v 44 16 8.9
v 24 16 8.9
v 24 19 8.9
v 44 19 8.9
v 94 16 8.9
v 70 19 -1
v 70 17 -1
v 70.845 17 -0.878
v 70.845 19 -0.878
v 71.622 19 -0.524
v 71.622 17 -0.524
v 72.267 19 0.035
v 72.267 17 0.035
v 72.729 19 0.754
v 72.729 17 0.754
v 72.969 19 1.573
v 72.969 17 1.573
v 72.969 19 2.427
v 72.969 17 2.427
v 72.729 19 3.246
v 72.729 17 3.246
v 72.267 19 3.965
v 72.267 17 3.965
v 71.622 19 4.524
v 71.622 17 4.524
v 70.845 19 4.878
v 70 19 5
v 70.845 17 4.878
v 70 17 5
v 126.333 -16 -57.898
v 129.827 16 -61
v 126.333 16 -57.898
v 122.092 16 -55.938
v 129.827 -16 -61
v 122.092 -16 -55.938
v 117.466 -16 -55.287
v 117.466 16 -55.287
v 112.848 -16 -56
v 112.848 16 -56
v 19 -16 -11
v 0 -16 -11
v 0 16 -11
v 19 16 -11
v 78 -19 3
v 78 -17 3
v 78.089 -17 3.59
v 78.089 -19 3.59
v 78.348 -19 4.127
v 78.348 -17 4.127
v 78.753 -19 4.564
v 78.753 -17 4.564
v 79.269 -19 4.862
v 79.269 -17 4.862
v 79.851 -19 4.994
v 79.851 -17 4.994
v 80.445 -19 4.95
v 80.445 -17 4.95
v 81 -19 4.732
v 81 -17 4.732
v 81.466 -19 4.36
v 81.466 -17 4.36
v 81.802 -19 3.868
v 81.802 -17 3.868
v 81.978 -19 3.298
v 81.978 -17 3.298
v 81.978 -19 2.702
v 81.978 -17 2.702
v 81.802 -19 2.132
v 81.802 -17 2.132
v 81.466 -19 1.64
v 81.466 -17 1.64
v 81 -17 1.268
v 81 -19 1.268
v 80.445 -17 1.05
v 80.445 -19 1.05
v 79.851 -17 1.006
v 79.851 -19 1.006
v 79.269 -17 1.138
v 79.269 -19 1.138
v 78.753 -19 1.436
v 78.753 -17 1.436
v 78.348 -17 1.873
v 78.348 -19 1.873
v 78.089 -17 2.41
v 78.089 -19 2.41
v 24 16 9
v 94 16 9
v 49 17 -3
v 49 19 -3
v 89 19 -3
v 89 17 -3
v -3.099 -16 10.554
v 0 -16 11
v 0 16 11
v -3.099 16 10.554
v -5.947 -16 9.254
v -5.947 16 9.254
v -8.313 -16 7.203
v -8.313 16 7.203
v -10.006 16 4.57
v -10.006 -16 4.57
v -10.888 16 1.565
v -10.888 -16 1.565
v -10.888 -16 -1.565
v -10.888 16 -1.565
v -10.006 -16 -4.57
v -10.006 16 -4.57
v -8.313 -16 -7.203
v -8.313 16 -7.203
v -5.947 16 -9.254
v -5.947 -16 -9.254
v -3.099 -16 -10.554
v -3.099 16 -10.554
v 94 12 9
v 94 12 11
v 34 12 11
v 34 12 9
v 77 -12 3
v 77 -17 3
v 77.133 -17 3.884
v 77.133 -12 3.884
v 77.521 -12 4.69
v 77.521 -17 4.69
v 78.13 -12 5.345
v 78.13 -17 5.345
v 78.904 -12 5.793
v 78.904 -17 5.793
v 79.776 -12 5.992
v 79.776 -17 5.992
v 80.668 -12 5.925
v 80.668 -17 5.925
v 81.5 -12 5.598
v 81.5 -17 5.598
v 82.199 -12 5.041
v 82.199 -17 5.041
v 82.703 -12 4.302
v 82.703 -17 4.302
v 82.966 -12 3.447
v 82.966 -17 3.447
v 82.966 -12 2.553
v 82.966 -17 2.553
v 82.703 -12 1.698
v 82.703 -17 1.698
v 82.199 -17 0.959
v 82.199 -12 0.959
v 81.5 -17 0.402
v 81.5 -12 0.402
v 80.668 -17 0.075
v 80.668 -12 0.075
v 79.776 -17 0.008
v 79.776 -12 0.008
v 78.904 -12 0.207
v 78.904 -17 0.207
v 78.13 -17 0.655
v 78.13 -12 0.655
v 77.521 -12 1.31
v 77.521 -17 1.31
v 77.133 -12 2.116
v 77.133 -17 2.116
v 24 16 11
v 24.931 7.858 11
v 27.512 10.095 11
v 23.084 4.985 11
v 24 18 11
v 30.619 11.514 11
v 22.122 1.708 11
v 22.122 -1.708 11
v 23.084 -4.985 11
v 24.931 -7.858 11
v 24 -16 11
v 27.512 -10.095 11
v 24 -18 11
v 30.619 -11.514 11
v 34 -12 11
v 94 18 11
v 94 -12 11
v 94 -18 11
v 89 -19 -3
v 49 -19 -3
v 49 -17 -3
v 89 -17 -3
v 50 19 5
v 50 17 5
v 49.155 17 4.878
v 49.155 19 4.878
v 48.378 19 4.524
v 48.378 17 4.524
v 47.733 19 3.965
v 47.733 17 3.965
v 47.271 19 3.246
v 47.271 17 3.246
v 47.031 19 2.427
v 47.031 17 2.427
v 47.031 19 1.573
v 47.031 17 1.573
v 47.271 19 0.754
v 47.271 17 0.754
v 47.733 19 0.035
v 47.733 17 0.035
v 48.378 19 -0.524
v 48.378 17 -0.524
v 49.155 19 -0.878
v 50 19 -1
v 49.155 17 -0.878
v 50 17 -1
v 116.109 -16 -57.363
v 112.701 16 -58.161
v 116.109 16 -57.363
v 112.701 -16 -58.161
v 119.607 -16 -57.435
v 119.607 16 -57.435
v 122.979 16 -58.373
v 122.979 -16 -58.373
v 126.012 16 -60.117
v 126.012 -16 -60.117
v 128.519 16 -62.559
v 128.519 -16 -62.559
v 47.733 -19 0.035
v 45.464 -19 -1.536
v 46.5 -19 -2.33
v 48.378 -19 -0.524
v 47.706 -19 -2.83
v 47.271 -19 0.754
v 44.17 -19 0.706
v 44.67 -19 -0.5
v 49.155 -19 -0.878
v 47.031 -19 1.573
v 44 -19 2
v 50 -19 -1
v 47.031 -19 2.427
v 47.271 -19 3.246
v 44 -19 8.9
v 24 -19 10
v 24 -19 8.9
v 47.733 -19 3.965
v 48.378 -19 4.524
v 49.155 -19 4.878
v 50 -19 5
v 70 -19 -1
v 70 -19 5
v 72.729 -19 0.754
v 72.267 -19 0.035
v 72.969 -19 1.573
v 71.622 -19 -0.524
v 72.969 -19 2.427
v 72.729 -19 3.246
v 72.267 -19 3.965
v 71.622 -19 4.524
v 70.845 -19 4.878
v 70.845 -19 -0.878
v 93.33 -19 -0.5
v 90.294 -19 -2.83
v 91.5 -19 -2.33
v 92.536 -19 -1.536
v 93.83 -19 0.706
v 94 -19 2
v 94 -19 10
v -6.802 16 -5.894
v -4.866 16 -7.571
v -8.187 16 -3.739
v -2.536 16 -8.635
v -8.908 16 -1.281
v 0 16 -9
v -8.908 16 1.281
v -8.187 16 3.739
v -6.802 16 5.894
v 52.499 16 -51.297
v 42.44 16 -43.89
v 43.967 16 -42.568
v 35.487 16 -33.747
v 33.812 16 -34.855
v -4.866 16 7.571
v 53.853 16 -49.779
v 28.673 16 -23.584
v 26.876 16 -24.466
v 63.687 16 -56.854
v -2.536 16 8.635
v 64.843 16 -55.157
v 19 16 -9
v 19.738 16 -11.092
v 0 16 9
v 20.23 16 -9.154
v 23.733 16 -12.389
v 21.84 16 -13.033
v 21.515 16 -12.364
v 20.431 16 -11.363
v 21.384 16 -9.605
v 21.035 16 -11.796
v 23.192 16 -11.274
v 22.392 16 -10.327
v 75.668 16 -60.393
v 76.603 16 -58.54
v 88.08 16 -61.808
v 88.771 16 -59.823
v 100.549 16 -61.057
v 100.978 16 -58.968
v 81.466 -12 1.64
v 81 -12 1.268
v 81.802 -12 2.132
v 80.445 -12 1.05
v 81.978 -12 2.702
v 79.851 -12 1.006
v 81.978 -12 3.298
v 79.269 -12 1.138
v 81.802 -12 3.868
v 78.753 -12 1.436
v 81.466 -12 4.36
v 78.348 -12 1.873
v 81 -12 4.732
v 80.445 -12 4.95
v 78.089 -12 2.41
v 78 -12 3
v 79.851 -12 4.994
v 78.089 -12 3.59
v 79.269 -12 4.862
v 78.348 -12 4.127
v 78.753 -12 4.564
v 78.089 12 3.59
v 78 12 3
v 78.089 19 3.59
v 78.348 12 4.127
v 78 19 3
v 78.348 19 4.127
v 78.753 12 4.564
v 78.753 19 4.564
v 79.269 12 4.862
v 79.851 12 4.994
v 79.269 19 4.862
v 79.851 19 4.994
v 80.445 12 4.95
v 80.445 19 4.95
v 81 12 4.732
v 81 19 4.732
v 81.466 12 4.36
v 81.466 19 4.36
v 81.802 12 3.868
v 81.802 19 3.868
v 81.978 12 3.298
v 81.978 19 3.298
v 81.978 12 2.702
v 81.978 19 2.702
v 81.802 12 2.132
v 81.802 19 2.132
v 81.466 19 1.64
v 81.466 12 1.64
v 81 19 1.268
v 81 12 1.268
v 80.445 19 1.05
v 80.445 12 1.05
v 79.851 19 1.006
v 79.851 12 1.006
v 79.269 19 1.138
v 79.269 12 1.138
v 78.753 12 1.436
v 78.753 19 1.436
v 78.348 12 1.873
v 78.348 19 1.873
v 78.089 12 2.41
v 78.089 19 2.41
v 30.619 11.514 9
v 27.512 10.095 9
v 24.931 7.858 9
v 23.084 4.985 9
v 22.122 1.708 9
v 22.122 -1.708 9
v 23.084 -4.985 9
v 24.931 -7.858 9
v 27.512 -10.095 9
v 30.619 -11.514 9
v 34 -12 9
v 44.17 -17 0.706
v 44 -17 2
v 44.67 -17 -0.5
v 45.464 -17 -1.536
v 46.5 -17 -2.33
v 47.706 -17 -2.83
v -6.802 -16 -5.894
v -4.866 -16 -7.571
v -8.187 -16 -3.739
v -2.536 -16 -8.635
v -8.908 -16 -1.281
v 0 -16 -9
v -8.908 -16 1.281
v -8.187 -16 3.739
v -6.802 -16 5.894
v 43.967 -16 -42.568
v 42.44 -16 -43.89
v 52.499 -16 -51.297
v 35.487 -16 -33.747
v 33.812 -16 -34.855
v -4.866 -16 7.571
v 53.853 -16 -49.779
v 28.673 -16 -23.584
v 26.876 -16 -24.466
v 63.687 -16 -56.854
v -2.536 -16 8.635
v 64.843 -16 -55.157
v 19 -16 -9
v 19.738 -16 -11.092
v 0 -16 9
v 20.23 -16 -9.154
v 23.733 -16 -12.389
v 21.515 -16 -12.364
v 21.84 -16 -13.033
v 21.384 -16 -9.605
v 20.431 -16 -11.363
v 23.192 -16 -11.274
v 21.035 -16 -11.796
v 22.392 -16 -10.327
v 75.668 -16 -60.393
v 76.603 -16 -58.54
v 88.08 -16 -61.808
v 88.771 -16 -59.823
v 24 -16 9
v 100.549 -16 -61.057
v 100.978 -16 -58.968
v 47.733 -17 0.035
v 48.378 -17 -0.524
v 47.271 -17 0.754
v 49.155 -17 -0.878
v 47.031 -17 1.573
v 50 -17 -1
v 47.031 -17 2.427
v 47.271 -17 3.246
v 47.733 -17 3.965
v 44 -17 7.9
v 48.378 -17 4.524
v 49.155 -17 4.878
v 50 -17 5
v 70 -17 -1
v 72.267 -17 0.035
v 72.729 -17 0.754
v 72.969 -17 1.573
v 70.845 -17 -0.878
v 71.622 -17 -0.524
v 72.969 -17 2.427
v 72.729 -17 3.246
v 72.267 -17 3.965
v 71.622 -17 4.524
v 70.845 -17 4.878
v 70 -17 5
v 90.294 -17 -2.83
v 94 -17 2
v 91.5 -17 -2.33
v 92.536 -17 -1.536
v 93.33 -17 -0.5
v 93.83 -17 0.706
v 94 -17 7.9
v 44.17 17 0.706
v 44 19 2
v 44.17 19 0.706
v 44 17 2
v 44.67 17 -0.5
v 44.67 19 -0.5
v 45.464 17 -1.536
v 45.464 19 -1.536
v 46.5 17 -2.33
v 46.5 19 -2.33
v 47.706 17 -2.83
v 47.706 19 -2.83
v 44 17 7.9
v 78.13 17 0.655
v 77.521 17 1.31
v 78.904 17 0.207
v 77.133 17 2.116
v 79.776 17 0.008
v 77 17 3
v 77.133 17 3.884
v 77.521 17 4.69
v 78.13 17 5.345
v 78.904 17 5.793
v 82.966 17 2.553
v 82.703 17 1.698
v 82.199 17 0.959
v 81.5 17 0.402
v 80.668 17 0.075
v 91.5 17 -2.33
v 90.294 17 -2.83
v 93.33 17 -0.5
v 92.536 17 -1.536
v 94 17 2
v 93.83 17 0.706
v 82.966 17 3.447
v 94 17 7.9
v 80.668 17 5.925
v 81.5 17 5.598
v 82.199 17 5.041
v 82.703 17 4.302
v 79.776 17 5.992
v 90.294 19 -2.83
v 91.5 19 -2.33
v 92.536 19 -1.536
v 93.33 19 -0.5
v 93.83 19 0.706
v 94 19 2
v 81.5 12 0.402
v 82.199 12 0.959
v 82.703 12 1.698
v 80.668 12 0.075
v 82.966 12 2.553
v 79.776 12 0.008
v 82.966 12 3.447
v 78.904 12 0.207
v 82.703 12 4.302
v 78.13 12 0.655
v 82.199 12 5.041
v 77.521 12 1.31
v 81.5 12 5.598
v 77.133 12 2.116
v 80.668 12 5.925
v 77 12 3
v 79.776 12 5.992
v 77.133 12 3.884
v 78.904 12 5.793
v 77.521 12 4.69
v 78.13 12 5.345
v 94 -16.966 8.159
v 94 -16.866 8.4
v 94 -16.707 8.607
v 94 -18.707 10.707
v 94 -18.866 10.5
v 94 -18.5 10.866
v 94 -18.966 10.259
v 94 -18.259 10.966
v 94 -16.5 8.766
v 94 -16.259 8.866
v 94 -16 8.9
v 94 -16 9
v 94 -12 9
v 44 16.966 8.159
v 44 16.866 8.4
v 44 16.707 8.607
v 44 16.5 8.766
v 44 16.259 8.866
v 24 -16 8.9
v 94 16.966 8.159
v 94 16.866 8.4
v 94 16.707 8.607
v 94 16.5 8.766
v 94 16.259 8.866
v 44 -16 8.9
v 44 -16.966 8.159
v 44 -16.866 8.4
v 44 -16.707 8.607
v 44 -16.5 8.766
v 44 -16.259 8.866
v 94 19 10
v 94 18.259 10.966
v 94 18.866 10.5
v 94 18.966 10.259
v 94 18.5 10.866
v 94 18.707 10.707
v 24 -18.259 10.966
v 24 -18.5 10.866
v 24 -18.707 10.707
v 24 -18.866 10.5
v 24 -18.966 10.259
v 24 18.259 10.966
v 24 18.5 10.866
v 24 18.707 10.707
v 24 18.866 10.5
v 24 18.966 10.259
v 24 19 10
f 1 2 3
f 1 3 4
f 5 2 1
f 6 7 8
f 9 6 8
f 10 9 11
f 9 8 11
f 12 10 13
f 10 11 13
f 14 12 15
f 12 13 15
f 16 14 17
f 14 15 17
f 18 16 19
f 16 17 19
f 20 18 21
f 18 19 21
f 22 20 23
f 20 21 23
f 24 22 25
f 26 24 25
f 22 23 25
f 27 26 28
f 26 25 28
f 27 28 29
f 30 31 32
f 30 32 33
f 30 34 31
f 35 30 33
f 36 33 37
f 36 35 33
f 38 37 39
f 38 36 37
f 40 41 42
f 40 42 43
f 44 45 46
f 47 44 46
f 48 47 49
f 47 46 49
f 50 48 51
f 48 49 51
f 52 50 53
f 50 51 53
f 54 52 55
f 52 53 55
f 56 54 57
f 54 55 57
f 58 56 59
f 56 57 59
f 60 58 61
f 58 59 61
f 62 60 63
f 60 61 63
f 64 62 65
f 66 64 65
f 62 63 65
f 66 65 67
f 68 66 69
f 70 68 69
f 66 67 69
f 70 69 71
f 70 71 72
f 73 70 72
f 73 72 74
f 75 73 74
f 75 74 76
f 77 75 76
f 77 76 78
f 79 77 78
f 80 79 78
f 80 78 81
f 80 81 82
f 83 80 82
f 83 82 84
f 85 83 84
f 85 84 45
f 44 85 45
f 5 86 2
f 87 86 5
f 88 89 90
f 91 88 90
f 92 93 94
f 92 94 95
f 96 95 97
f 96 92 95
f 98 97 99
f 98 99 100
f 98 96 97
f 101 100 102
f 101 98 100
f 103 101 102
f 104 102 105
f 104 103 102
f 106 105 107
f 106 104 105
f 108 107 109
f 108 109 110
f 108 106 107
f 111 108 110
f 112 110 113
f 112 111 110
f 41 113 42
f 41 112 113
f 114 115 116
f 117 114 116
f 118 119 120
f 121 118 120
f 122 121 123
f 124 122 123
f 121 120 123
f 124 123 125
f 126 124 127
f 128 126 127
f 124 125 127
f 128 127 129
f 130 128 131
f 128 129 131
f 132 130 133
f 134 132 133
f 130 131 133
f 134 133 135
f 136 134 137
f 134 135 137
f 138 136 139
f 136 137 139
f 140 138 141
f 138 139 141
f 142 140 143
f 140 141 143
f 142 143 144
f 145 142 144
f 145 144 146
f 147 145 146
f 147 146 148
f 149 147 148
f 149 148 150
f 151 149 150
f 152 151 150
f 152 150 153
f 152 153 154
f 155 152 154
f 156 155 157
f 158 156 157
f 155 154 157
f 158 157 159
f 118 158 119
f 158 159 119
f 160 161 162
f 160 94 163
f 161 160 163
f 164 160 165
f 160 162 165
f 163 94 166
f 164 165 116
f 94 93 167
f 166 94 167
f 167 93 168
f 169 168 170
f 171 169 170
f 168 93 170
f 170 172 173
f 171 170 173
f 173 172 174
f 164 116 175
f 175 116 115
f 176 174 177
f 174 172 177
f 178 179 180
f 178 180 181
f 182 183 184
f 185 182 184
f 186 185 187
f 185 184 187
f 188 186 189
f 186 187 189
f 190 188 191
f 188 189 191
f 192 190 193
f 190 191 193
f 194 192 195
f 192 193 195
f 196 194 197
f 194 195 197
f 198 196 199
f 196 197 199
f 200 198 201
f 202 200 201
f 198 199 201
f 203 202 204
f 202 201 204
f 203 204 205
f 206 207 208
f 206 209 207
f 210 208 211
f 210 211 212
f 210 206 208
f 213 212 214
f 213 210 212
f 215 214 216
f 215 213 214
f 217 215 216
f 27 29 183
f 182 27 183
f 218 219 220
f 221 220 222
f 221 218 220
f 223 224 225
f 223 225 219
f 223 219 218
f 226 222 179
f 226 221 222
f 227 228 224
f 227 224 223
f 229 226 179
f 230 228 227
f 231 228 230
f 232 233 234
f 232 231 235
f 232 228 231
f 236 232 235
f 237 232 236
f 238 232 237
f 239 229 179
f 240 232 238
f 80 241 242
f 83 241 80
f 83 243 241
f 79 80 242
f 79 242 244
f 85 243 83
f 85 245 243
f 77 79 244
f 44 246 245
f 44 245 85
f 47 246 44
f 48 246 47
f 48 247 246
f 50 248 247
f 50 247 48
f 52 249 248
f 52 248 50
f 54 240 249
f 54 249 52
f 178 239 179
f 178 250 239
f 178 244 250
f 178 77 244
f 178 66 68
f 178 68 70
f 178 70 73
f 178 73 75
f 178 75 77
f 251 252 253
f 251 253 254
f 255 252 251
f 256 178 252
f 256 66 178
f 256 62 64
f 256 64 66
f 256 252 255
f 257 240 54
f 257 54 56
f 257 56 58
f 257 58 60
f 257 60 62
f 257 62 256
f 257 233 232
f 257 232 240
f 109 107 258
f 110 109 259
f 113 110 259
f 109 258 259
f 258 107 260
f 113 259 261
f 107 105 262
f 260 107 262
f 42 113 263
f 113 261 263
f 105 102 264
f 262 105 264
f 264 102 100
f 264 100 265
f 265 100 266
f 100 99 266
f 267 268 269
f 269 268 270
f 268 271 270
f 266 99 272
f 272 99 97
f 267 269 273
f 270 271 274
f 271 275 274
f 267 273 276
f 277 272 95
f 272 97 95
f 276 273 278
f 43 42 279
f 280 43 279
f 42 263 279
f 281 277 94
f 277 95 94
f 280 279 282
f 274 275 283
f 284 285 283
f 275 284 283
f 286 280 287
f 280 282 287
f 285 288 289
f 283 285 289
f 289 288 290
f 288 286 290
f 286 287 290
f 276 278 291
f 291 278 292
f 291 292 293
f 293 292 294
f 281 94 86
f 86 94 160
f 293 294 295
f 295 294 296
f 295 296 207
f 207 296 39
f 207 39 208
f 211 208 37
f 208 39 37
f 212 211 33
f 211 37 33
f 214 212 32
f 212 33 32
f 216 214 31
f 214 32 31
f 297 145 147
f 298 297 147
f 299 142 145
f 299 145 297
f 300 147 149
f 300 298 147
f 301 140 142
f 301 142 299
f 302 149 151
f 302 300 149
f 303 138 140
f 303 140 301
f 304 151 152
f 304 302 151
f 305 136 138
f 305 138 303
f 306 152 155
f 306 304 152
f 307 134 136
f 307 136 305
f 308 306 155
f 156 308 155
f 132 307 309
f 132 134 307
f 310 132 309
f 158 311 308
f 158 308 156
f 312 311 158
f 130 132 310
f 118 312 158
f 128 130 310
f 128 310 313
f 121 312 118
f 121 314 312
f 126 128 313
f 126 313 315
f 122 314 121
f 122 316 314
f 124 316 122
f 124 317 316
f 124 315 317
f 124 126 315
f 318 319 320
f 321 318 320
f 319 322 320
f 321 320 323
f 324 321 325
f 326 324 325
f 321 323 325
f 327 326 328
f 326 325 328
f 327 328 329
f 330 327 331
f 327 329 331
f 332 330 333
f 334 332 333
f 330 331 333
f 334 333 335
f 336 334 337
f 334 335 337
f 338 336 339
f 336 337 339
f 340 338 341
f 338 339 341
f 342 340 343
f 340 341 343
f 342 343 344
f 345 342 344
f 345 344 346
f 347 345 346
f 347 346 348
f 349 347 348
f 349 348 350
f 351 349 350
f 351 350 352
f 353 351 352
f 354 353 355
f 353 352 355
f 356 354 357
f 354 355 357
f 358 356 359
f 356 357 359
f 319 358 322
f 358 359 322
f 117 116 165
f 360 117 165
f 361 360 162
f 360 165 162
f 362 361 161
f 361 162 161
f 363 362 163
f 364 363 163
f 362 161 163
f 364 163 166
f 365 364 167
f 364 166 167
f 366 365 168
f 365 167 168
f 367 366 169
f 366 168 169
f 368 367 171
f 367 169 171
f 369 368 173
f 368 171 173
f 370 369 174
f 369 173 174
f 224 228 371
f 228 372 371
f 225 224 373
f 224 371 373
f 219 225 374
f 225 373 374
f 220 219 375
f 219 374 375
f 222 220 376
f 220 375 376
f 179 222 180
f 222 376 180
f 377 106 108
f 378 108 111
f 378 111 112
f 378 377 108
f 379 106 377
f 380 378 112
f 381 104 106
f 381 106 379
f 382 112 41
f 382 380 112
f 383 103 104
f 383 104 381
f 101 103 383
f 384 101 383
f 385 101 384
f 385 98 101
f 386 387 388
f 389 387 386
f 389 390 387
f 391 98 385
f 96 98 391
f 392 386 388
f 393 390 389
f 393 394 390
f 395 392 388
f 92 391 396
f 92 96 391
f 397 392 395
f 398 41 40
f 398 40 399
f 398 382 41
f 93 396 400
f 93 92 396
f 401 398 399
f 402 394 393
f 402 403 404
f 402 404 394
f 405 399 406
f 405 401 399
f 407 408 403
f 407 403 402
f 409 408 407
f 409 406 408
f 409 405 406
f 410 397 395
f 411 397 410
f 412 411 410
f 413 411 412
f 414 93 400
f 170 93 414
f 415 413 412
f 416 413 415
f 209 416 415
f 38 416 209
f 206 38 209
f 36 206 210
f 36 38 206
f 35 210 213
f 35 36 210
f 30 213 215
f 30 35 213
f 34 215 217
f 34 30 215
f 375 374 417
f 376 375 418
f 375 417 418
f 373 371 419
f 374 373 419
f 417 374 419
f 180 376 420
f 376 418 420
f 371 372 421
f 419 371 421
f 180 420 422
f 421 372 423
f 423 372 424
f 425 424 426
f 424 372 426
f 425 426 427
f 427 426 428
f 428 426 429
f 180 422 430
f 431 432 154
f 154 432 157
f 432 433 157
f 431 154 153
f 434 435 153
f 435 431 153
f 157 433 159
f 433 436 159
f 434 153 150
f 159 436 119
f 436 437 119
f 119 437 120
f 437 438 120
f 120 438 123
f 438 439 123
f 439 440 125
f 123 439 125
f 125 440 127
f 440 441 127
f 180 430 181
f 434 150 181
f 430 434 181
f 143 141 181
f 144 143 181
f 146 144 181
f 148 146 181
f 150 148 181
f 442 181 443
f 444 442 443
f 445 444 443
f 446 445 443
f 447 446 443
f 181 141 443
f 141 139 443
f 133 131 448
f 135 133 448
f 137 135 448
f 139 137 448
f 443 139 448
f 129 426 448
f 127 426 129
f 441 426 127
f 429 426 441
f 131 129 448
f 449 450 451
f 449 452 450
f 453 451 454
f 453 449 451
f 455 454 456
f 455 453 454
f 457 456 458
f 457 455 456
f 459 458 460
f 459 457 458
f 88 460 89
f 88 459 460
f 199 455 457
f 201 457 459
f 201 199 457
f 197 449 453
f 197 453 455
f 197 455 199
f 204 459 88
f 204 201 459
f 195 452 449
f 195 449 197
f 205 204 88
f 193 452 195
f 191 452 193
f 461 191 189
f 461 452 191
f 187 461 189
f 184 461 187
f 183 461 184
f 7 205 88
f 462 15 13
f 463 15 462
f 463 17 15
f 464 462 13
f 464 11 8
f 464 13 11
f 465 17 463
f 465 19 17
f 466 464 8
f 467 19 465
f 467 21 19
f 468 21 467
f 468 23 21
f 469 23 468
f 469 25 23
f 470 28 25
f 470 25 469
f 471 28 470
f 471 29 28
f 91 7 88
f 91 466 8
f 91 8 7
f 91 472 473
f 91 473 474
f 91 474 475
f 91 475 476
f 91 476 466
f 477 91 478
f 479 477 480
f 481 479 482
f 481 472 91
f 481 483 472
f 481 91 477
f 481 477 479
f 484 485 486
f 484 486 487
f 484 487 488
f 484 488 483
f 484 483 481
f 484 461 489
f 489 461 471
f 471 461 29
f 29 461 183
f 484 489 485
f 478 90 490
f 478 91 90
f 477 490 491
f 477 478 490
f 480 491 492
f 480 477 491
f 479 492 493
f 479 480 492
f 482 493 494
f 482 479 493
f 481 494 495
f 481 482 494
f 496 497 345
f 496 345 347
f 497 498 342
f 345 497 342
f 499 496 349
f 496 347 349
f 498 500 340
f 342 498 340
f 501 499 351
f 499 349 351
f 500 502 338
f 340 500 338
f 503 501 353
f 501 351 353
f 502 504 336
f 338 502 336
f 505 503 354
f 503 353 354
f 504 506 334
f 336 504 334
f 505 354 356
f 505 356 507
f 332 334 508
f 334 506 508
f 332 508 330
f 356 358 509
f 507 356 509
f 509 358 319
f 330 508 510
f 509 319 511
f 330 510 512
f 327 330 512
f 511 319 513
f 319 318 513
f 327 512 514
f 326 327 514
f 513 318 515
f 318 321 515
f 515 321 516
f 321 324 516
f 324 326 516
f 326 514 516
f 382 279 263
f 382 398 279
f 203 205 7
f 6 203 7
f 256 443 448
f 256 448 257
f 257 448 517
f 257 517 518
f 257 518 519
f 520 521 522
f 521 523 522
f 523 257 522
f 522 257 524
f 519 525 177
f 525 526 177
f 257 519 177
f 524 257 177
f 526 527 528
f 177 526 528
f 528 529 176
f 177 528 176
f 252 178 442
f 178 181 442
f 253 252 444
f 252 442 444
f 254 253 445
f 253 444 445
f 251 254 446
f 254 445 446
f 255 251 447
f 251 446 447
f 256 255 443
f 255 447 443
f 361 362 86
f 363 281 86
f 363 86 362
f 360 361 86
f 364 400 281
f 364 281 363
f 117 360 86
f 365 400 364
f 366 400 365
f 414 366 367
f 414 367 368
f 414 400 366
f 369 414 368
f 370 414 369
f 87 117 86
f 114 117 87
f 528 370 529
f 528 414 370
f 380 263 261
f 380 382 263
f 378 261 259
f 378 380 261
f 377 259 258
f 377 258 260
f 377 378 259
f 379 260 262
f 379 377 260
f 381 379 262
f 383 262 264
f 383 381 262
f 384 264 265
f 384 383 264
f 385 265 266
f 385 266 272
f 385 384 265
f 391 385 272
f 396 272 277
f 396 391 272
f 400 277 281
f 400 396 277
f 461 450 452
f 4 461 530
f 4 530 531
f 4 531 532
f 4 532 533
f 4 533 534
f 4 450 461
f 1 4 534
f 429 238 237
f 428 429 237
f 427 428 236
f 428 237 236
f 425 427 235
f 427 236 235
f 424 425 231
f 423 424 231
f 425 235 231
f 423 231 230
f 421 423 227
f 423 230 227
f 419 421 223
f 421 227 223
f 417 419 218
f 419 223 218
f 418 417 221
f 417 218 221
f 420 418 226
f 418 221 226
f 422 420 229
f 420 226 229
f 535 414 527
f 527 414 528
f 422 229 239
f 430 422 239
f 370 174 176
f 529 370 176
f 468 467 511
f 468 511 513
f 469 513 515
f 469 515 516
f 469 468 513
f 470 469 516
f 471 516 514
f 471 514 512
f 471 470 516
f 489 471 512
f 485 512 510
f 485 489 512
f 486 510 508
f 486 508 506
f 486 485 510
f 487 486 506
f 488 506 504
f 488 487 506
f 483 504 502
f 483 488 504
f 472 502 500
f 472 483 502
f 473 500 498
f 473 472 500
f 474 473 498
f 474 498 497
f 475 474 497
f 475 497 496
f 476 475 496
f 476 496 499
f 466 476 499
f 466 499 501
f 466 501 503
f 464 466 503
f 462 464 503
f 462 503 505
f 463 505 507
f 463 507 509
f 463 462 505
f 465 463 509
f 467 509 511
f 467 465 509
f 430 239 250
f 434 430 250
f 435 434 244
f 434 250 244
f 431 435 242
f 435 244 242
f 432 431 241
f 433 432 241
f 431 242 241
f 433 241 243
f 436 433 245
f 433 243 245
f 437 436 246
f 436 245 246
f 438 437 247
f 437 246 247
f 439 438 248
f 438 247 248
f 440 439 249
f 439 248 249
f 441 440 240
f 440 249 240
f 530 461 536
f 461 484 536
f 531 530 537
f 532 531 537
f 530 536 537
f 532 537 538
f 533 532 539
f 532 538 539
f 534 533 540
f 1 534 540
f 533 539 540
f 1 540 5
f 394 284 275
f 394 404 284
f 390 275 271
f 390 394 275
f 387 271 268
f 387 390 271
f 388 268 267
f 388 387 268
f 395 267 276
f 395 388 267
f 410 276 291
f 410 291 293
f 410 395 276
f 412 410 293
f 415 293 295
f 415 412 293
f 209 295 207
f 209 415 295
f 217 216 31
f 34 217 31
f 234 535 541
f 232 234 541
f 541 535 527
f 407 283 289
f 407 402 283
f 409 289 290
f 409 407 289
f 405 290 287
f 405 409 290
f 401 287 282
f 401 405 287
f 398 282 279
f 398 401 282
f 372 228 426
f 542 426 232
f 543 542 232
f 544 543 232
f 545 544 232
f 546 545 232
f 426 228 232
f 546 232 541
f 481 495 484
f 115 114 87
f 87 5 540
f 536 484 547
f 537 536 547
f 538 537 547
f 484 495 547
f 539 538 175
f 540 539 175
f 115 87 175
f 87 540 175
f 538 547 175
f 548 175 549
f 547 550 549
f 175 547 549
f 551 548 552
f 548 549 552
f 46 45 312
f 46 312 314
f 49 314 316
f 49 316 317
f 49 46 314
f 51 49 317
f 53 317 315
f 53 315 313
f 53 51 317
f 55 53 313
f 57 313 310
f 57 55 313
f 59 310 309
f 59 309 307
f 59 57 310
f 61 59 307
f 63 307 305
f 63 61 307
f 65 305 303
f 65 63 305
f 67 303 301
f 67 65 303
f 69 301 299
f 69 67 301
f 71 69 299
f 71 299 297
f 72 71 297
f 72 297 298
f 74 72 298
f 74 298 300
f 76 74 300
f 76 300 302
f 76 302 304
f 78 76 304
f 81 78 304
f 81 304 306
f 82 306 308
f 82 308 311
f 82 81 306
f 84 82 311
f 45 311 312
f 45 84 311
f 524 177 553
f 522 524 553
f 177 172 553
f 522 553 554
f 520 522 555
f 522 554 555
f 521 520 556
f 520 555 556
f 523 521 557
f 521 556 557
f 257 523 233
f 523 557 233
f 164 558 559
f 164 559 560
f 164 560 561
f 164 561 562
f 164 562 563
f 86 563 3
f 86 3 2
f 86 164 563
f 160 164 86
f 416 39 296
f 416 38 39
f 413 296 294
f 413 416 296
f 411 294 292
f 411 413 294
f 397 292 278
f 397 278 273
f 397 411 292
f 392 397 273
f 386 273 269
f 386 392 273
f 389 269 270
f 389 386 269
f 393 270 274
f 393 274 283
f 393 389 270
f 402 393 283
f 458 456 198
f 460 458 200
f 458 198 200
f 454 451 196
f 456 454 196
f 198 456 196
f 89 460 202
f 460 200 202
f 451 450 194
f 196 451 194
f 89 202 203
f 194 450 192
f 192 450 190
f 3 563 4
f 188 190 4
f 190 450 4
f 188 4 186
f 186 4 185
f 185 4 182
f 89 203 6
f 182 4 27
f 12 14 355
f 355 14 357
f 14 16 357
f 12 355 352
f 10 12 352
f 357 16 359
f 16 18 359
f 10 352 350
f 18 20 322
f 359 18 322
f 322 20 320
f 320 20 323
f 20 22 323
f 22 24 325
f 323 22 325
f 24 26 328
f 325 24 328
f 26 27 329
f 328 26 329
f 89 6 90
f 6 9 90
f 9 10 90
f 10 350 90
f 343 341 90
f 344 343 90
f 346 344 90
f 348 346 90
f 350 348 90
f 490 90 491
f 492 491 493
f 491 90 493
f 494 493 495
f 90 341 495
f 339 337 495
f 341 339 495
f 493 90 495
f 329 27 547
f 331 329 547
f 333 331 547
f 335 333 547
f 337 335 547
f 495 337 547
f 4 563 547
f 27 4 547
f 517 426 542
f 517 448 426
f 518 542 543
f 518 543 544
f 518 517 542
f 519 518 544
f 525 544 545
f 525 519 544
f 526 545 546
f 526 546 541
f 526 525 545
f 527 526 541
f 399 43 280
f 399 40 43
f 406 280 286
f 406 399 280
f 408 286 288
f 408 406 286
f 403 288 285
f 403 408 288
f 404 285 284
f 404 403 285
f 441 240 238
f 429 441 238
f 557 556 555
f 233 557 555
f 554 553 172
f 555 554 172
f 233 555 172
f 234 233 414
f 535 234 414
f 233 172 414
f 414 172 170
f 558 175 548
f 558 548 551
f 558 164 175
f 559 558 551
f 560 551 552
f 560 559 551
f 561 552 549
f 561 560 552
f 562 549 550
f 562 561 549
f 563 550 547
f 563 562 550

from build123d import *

# Parameters (mm, degrees)
F1_DEPTH  = 16
F2_W      = 70
F2_H      = 3
F3_DEPTH  = 2.1
F4_W      = 50
F4_H      = 14
F5_DEPTH  = 2
F6_R      = 0.99999
F9_DEPTH  = 2
F11_DEPTH = 38.001
F13_D     = 4
F14_R     = 3
F14_R_2   = 2
F15_DEPTH = 5
F16_R     = 5


# Not quite as in the source:
# - a fillet or chamfer is up to 0.001 mm smaller than in the source, because OpenCascade refuses the exact size
# - a pattern or mirror of a feature is missing from the dataset's text; its kind, count and spacing are read off the source's solid


with BuildPart() as f1:
    # F0 (on Front) → F1 (new body)
    with BuildSketch(Plane.XZ):
        with BuildLine():
            ThreePointArc((0, -9), (-9, 0), (0, 9))
            Line((0, 9), (94, 9))
            Line((94, 9), (94, 11))
            Line((94, 11), (0, 11))
            ThreePointArc((0, 11), (-11, 0), (0, -11))
            Line((0, -11), (19, -11))
            ThreePointArc((19, -11), (20.7464347921, -11.5607448848), (21.84, -13.0333563221))
            ThreePointArc((21.84, -13.0333563221), (57.9725997897, -54.3183684737), (112.7014609544, -58.1613818136))
            ThreePointArc((112.7014609544, -58.1613818136), (121.3224001133, -57.7984242203), (128.5187831367, -62.5591386181))
            Line((128.5187831367, -62.5591386181), (129.8270557762, -61))
            ThreePointArc((129.8270557762, -61), (122.0920530207, -55.9384698962), (112.8483757943, -56))
            ThreePointArc((112.8483757943, -56), (59.2303979034, -52.7086373708), (23.7333333333, -12.3889272035))
            ThreePointArc((23.7333333333, -12.3889272035), (21.9107246536, -9.9345748081), (19, -9))
            Line((19, -9), (0, -9))
        make_face()
    extrude(amount=F1_DEPTH)

    # F2 (on face) → F3 (join)
    with BuildSketch(Plane.XY.offset(11)):
        with Locations((59, -17.5)):
            Rectangle(F2_W, F2_H)
    extrude(amount=-F3_DEPTH)

    # F4 (on face) → F5 (join)
    with BuildSketch(Plane.XZ.offset(19)):
        with Locations((69, 4)):
            Rectangle(F4_W, F4_H)
    extrude(amount=-F5_DEPTH)

    # F6 (radius 1 in the source; OpenCascade refuses exactly that, so slightly less here)
    f6_edges = [f1.edges().sort_by_distance(p)[0] for p in [
        (59, -19, 11),
        (69, -17, 8.9),
    ]]
    fillet(f6_edges, radius=F6_R)

    # F7: F1 across plane


with BuildPart() as f1_1:
    add(f1.part)
    add(f1.part.mirror(Plane.XZ))

    # F8 (on face) → F9 (cut)
    with BuildSketch(Plane.XY.offset(11)):
        with BuildLine():
            Line((94, 12), (34, 12))
            ThreePointArc((34, 12), (22, 0), (34, -12))
            Line((34, -12), (94, -12))
            Line((94, -12), (94, 12))
        make_face()
    extrude(amount=-F9_DEPTH, mode=Mode.SUBTRACT)

    # F10 (on face) → F11 (cut, through all)
    with BuildSketch(Plane.XZ.offset(19)):
        with BuildLine():
            ThreePointArc((50, 5), (47, 2), (50, -1))
            Line((50, -1), (70, -1))
            ThreePointArc((70, -1), (73, 2), (70, 5))
            Line((70, 5), (50, 5))
        make_face()
    extrude(amount=-F11_DEPTH, mode=Mode.SUBTRACT)

    # F13 (through all)
    with Locations(Plane.XZ.offset(19)):
        with Locations((80, 3)):
            Hole(F13_D / 2)

    # F14 (on face) → F15 (join)
    with BuildSketch(Plane(origin=(0, -17, 0), x_dir=(-1, 0, 0), z_dir=(0, 1, 0))):
        with Locations((-80, 3)):
            Circle(F14_R)
        with Locations((-80, 3)):
            Circle(F14_R_2, mode=Mode.SUBTRACT)
    f15 = extrude(amount=F15_DEPTH)

    # F15_copies: F15 across plane
    add(f15.mirror(Plane.ZX))

    # F16
    f16_edges = [f1_1.edges().sort_by_distance(p)[0] for p in [
        (94, -18, -3),
        (94, 18, -3),
        (44, -18, -3),
        (44, 18, -3),
    ]]
    fillet(f16_edges, radius=F16_R)


solid = f1_1.part
